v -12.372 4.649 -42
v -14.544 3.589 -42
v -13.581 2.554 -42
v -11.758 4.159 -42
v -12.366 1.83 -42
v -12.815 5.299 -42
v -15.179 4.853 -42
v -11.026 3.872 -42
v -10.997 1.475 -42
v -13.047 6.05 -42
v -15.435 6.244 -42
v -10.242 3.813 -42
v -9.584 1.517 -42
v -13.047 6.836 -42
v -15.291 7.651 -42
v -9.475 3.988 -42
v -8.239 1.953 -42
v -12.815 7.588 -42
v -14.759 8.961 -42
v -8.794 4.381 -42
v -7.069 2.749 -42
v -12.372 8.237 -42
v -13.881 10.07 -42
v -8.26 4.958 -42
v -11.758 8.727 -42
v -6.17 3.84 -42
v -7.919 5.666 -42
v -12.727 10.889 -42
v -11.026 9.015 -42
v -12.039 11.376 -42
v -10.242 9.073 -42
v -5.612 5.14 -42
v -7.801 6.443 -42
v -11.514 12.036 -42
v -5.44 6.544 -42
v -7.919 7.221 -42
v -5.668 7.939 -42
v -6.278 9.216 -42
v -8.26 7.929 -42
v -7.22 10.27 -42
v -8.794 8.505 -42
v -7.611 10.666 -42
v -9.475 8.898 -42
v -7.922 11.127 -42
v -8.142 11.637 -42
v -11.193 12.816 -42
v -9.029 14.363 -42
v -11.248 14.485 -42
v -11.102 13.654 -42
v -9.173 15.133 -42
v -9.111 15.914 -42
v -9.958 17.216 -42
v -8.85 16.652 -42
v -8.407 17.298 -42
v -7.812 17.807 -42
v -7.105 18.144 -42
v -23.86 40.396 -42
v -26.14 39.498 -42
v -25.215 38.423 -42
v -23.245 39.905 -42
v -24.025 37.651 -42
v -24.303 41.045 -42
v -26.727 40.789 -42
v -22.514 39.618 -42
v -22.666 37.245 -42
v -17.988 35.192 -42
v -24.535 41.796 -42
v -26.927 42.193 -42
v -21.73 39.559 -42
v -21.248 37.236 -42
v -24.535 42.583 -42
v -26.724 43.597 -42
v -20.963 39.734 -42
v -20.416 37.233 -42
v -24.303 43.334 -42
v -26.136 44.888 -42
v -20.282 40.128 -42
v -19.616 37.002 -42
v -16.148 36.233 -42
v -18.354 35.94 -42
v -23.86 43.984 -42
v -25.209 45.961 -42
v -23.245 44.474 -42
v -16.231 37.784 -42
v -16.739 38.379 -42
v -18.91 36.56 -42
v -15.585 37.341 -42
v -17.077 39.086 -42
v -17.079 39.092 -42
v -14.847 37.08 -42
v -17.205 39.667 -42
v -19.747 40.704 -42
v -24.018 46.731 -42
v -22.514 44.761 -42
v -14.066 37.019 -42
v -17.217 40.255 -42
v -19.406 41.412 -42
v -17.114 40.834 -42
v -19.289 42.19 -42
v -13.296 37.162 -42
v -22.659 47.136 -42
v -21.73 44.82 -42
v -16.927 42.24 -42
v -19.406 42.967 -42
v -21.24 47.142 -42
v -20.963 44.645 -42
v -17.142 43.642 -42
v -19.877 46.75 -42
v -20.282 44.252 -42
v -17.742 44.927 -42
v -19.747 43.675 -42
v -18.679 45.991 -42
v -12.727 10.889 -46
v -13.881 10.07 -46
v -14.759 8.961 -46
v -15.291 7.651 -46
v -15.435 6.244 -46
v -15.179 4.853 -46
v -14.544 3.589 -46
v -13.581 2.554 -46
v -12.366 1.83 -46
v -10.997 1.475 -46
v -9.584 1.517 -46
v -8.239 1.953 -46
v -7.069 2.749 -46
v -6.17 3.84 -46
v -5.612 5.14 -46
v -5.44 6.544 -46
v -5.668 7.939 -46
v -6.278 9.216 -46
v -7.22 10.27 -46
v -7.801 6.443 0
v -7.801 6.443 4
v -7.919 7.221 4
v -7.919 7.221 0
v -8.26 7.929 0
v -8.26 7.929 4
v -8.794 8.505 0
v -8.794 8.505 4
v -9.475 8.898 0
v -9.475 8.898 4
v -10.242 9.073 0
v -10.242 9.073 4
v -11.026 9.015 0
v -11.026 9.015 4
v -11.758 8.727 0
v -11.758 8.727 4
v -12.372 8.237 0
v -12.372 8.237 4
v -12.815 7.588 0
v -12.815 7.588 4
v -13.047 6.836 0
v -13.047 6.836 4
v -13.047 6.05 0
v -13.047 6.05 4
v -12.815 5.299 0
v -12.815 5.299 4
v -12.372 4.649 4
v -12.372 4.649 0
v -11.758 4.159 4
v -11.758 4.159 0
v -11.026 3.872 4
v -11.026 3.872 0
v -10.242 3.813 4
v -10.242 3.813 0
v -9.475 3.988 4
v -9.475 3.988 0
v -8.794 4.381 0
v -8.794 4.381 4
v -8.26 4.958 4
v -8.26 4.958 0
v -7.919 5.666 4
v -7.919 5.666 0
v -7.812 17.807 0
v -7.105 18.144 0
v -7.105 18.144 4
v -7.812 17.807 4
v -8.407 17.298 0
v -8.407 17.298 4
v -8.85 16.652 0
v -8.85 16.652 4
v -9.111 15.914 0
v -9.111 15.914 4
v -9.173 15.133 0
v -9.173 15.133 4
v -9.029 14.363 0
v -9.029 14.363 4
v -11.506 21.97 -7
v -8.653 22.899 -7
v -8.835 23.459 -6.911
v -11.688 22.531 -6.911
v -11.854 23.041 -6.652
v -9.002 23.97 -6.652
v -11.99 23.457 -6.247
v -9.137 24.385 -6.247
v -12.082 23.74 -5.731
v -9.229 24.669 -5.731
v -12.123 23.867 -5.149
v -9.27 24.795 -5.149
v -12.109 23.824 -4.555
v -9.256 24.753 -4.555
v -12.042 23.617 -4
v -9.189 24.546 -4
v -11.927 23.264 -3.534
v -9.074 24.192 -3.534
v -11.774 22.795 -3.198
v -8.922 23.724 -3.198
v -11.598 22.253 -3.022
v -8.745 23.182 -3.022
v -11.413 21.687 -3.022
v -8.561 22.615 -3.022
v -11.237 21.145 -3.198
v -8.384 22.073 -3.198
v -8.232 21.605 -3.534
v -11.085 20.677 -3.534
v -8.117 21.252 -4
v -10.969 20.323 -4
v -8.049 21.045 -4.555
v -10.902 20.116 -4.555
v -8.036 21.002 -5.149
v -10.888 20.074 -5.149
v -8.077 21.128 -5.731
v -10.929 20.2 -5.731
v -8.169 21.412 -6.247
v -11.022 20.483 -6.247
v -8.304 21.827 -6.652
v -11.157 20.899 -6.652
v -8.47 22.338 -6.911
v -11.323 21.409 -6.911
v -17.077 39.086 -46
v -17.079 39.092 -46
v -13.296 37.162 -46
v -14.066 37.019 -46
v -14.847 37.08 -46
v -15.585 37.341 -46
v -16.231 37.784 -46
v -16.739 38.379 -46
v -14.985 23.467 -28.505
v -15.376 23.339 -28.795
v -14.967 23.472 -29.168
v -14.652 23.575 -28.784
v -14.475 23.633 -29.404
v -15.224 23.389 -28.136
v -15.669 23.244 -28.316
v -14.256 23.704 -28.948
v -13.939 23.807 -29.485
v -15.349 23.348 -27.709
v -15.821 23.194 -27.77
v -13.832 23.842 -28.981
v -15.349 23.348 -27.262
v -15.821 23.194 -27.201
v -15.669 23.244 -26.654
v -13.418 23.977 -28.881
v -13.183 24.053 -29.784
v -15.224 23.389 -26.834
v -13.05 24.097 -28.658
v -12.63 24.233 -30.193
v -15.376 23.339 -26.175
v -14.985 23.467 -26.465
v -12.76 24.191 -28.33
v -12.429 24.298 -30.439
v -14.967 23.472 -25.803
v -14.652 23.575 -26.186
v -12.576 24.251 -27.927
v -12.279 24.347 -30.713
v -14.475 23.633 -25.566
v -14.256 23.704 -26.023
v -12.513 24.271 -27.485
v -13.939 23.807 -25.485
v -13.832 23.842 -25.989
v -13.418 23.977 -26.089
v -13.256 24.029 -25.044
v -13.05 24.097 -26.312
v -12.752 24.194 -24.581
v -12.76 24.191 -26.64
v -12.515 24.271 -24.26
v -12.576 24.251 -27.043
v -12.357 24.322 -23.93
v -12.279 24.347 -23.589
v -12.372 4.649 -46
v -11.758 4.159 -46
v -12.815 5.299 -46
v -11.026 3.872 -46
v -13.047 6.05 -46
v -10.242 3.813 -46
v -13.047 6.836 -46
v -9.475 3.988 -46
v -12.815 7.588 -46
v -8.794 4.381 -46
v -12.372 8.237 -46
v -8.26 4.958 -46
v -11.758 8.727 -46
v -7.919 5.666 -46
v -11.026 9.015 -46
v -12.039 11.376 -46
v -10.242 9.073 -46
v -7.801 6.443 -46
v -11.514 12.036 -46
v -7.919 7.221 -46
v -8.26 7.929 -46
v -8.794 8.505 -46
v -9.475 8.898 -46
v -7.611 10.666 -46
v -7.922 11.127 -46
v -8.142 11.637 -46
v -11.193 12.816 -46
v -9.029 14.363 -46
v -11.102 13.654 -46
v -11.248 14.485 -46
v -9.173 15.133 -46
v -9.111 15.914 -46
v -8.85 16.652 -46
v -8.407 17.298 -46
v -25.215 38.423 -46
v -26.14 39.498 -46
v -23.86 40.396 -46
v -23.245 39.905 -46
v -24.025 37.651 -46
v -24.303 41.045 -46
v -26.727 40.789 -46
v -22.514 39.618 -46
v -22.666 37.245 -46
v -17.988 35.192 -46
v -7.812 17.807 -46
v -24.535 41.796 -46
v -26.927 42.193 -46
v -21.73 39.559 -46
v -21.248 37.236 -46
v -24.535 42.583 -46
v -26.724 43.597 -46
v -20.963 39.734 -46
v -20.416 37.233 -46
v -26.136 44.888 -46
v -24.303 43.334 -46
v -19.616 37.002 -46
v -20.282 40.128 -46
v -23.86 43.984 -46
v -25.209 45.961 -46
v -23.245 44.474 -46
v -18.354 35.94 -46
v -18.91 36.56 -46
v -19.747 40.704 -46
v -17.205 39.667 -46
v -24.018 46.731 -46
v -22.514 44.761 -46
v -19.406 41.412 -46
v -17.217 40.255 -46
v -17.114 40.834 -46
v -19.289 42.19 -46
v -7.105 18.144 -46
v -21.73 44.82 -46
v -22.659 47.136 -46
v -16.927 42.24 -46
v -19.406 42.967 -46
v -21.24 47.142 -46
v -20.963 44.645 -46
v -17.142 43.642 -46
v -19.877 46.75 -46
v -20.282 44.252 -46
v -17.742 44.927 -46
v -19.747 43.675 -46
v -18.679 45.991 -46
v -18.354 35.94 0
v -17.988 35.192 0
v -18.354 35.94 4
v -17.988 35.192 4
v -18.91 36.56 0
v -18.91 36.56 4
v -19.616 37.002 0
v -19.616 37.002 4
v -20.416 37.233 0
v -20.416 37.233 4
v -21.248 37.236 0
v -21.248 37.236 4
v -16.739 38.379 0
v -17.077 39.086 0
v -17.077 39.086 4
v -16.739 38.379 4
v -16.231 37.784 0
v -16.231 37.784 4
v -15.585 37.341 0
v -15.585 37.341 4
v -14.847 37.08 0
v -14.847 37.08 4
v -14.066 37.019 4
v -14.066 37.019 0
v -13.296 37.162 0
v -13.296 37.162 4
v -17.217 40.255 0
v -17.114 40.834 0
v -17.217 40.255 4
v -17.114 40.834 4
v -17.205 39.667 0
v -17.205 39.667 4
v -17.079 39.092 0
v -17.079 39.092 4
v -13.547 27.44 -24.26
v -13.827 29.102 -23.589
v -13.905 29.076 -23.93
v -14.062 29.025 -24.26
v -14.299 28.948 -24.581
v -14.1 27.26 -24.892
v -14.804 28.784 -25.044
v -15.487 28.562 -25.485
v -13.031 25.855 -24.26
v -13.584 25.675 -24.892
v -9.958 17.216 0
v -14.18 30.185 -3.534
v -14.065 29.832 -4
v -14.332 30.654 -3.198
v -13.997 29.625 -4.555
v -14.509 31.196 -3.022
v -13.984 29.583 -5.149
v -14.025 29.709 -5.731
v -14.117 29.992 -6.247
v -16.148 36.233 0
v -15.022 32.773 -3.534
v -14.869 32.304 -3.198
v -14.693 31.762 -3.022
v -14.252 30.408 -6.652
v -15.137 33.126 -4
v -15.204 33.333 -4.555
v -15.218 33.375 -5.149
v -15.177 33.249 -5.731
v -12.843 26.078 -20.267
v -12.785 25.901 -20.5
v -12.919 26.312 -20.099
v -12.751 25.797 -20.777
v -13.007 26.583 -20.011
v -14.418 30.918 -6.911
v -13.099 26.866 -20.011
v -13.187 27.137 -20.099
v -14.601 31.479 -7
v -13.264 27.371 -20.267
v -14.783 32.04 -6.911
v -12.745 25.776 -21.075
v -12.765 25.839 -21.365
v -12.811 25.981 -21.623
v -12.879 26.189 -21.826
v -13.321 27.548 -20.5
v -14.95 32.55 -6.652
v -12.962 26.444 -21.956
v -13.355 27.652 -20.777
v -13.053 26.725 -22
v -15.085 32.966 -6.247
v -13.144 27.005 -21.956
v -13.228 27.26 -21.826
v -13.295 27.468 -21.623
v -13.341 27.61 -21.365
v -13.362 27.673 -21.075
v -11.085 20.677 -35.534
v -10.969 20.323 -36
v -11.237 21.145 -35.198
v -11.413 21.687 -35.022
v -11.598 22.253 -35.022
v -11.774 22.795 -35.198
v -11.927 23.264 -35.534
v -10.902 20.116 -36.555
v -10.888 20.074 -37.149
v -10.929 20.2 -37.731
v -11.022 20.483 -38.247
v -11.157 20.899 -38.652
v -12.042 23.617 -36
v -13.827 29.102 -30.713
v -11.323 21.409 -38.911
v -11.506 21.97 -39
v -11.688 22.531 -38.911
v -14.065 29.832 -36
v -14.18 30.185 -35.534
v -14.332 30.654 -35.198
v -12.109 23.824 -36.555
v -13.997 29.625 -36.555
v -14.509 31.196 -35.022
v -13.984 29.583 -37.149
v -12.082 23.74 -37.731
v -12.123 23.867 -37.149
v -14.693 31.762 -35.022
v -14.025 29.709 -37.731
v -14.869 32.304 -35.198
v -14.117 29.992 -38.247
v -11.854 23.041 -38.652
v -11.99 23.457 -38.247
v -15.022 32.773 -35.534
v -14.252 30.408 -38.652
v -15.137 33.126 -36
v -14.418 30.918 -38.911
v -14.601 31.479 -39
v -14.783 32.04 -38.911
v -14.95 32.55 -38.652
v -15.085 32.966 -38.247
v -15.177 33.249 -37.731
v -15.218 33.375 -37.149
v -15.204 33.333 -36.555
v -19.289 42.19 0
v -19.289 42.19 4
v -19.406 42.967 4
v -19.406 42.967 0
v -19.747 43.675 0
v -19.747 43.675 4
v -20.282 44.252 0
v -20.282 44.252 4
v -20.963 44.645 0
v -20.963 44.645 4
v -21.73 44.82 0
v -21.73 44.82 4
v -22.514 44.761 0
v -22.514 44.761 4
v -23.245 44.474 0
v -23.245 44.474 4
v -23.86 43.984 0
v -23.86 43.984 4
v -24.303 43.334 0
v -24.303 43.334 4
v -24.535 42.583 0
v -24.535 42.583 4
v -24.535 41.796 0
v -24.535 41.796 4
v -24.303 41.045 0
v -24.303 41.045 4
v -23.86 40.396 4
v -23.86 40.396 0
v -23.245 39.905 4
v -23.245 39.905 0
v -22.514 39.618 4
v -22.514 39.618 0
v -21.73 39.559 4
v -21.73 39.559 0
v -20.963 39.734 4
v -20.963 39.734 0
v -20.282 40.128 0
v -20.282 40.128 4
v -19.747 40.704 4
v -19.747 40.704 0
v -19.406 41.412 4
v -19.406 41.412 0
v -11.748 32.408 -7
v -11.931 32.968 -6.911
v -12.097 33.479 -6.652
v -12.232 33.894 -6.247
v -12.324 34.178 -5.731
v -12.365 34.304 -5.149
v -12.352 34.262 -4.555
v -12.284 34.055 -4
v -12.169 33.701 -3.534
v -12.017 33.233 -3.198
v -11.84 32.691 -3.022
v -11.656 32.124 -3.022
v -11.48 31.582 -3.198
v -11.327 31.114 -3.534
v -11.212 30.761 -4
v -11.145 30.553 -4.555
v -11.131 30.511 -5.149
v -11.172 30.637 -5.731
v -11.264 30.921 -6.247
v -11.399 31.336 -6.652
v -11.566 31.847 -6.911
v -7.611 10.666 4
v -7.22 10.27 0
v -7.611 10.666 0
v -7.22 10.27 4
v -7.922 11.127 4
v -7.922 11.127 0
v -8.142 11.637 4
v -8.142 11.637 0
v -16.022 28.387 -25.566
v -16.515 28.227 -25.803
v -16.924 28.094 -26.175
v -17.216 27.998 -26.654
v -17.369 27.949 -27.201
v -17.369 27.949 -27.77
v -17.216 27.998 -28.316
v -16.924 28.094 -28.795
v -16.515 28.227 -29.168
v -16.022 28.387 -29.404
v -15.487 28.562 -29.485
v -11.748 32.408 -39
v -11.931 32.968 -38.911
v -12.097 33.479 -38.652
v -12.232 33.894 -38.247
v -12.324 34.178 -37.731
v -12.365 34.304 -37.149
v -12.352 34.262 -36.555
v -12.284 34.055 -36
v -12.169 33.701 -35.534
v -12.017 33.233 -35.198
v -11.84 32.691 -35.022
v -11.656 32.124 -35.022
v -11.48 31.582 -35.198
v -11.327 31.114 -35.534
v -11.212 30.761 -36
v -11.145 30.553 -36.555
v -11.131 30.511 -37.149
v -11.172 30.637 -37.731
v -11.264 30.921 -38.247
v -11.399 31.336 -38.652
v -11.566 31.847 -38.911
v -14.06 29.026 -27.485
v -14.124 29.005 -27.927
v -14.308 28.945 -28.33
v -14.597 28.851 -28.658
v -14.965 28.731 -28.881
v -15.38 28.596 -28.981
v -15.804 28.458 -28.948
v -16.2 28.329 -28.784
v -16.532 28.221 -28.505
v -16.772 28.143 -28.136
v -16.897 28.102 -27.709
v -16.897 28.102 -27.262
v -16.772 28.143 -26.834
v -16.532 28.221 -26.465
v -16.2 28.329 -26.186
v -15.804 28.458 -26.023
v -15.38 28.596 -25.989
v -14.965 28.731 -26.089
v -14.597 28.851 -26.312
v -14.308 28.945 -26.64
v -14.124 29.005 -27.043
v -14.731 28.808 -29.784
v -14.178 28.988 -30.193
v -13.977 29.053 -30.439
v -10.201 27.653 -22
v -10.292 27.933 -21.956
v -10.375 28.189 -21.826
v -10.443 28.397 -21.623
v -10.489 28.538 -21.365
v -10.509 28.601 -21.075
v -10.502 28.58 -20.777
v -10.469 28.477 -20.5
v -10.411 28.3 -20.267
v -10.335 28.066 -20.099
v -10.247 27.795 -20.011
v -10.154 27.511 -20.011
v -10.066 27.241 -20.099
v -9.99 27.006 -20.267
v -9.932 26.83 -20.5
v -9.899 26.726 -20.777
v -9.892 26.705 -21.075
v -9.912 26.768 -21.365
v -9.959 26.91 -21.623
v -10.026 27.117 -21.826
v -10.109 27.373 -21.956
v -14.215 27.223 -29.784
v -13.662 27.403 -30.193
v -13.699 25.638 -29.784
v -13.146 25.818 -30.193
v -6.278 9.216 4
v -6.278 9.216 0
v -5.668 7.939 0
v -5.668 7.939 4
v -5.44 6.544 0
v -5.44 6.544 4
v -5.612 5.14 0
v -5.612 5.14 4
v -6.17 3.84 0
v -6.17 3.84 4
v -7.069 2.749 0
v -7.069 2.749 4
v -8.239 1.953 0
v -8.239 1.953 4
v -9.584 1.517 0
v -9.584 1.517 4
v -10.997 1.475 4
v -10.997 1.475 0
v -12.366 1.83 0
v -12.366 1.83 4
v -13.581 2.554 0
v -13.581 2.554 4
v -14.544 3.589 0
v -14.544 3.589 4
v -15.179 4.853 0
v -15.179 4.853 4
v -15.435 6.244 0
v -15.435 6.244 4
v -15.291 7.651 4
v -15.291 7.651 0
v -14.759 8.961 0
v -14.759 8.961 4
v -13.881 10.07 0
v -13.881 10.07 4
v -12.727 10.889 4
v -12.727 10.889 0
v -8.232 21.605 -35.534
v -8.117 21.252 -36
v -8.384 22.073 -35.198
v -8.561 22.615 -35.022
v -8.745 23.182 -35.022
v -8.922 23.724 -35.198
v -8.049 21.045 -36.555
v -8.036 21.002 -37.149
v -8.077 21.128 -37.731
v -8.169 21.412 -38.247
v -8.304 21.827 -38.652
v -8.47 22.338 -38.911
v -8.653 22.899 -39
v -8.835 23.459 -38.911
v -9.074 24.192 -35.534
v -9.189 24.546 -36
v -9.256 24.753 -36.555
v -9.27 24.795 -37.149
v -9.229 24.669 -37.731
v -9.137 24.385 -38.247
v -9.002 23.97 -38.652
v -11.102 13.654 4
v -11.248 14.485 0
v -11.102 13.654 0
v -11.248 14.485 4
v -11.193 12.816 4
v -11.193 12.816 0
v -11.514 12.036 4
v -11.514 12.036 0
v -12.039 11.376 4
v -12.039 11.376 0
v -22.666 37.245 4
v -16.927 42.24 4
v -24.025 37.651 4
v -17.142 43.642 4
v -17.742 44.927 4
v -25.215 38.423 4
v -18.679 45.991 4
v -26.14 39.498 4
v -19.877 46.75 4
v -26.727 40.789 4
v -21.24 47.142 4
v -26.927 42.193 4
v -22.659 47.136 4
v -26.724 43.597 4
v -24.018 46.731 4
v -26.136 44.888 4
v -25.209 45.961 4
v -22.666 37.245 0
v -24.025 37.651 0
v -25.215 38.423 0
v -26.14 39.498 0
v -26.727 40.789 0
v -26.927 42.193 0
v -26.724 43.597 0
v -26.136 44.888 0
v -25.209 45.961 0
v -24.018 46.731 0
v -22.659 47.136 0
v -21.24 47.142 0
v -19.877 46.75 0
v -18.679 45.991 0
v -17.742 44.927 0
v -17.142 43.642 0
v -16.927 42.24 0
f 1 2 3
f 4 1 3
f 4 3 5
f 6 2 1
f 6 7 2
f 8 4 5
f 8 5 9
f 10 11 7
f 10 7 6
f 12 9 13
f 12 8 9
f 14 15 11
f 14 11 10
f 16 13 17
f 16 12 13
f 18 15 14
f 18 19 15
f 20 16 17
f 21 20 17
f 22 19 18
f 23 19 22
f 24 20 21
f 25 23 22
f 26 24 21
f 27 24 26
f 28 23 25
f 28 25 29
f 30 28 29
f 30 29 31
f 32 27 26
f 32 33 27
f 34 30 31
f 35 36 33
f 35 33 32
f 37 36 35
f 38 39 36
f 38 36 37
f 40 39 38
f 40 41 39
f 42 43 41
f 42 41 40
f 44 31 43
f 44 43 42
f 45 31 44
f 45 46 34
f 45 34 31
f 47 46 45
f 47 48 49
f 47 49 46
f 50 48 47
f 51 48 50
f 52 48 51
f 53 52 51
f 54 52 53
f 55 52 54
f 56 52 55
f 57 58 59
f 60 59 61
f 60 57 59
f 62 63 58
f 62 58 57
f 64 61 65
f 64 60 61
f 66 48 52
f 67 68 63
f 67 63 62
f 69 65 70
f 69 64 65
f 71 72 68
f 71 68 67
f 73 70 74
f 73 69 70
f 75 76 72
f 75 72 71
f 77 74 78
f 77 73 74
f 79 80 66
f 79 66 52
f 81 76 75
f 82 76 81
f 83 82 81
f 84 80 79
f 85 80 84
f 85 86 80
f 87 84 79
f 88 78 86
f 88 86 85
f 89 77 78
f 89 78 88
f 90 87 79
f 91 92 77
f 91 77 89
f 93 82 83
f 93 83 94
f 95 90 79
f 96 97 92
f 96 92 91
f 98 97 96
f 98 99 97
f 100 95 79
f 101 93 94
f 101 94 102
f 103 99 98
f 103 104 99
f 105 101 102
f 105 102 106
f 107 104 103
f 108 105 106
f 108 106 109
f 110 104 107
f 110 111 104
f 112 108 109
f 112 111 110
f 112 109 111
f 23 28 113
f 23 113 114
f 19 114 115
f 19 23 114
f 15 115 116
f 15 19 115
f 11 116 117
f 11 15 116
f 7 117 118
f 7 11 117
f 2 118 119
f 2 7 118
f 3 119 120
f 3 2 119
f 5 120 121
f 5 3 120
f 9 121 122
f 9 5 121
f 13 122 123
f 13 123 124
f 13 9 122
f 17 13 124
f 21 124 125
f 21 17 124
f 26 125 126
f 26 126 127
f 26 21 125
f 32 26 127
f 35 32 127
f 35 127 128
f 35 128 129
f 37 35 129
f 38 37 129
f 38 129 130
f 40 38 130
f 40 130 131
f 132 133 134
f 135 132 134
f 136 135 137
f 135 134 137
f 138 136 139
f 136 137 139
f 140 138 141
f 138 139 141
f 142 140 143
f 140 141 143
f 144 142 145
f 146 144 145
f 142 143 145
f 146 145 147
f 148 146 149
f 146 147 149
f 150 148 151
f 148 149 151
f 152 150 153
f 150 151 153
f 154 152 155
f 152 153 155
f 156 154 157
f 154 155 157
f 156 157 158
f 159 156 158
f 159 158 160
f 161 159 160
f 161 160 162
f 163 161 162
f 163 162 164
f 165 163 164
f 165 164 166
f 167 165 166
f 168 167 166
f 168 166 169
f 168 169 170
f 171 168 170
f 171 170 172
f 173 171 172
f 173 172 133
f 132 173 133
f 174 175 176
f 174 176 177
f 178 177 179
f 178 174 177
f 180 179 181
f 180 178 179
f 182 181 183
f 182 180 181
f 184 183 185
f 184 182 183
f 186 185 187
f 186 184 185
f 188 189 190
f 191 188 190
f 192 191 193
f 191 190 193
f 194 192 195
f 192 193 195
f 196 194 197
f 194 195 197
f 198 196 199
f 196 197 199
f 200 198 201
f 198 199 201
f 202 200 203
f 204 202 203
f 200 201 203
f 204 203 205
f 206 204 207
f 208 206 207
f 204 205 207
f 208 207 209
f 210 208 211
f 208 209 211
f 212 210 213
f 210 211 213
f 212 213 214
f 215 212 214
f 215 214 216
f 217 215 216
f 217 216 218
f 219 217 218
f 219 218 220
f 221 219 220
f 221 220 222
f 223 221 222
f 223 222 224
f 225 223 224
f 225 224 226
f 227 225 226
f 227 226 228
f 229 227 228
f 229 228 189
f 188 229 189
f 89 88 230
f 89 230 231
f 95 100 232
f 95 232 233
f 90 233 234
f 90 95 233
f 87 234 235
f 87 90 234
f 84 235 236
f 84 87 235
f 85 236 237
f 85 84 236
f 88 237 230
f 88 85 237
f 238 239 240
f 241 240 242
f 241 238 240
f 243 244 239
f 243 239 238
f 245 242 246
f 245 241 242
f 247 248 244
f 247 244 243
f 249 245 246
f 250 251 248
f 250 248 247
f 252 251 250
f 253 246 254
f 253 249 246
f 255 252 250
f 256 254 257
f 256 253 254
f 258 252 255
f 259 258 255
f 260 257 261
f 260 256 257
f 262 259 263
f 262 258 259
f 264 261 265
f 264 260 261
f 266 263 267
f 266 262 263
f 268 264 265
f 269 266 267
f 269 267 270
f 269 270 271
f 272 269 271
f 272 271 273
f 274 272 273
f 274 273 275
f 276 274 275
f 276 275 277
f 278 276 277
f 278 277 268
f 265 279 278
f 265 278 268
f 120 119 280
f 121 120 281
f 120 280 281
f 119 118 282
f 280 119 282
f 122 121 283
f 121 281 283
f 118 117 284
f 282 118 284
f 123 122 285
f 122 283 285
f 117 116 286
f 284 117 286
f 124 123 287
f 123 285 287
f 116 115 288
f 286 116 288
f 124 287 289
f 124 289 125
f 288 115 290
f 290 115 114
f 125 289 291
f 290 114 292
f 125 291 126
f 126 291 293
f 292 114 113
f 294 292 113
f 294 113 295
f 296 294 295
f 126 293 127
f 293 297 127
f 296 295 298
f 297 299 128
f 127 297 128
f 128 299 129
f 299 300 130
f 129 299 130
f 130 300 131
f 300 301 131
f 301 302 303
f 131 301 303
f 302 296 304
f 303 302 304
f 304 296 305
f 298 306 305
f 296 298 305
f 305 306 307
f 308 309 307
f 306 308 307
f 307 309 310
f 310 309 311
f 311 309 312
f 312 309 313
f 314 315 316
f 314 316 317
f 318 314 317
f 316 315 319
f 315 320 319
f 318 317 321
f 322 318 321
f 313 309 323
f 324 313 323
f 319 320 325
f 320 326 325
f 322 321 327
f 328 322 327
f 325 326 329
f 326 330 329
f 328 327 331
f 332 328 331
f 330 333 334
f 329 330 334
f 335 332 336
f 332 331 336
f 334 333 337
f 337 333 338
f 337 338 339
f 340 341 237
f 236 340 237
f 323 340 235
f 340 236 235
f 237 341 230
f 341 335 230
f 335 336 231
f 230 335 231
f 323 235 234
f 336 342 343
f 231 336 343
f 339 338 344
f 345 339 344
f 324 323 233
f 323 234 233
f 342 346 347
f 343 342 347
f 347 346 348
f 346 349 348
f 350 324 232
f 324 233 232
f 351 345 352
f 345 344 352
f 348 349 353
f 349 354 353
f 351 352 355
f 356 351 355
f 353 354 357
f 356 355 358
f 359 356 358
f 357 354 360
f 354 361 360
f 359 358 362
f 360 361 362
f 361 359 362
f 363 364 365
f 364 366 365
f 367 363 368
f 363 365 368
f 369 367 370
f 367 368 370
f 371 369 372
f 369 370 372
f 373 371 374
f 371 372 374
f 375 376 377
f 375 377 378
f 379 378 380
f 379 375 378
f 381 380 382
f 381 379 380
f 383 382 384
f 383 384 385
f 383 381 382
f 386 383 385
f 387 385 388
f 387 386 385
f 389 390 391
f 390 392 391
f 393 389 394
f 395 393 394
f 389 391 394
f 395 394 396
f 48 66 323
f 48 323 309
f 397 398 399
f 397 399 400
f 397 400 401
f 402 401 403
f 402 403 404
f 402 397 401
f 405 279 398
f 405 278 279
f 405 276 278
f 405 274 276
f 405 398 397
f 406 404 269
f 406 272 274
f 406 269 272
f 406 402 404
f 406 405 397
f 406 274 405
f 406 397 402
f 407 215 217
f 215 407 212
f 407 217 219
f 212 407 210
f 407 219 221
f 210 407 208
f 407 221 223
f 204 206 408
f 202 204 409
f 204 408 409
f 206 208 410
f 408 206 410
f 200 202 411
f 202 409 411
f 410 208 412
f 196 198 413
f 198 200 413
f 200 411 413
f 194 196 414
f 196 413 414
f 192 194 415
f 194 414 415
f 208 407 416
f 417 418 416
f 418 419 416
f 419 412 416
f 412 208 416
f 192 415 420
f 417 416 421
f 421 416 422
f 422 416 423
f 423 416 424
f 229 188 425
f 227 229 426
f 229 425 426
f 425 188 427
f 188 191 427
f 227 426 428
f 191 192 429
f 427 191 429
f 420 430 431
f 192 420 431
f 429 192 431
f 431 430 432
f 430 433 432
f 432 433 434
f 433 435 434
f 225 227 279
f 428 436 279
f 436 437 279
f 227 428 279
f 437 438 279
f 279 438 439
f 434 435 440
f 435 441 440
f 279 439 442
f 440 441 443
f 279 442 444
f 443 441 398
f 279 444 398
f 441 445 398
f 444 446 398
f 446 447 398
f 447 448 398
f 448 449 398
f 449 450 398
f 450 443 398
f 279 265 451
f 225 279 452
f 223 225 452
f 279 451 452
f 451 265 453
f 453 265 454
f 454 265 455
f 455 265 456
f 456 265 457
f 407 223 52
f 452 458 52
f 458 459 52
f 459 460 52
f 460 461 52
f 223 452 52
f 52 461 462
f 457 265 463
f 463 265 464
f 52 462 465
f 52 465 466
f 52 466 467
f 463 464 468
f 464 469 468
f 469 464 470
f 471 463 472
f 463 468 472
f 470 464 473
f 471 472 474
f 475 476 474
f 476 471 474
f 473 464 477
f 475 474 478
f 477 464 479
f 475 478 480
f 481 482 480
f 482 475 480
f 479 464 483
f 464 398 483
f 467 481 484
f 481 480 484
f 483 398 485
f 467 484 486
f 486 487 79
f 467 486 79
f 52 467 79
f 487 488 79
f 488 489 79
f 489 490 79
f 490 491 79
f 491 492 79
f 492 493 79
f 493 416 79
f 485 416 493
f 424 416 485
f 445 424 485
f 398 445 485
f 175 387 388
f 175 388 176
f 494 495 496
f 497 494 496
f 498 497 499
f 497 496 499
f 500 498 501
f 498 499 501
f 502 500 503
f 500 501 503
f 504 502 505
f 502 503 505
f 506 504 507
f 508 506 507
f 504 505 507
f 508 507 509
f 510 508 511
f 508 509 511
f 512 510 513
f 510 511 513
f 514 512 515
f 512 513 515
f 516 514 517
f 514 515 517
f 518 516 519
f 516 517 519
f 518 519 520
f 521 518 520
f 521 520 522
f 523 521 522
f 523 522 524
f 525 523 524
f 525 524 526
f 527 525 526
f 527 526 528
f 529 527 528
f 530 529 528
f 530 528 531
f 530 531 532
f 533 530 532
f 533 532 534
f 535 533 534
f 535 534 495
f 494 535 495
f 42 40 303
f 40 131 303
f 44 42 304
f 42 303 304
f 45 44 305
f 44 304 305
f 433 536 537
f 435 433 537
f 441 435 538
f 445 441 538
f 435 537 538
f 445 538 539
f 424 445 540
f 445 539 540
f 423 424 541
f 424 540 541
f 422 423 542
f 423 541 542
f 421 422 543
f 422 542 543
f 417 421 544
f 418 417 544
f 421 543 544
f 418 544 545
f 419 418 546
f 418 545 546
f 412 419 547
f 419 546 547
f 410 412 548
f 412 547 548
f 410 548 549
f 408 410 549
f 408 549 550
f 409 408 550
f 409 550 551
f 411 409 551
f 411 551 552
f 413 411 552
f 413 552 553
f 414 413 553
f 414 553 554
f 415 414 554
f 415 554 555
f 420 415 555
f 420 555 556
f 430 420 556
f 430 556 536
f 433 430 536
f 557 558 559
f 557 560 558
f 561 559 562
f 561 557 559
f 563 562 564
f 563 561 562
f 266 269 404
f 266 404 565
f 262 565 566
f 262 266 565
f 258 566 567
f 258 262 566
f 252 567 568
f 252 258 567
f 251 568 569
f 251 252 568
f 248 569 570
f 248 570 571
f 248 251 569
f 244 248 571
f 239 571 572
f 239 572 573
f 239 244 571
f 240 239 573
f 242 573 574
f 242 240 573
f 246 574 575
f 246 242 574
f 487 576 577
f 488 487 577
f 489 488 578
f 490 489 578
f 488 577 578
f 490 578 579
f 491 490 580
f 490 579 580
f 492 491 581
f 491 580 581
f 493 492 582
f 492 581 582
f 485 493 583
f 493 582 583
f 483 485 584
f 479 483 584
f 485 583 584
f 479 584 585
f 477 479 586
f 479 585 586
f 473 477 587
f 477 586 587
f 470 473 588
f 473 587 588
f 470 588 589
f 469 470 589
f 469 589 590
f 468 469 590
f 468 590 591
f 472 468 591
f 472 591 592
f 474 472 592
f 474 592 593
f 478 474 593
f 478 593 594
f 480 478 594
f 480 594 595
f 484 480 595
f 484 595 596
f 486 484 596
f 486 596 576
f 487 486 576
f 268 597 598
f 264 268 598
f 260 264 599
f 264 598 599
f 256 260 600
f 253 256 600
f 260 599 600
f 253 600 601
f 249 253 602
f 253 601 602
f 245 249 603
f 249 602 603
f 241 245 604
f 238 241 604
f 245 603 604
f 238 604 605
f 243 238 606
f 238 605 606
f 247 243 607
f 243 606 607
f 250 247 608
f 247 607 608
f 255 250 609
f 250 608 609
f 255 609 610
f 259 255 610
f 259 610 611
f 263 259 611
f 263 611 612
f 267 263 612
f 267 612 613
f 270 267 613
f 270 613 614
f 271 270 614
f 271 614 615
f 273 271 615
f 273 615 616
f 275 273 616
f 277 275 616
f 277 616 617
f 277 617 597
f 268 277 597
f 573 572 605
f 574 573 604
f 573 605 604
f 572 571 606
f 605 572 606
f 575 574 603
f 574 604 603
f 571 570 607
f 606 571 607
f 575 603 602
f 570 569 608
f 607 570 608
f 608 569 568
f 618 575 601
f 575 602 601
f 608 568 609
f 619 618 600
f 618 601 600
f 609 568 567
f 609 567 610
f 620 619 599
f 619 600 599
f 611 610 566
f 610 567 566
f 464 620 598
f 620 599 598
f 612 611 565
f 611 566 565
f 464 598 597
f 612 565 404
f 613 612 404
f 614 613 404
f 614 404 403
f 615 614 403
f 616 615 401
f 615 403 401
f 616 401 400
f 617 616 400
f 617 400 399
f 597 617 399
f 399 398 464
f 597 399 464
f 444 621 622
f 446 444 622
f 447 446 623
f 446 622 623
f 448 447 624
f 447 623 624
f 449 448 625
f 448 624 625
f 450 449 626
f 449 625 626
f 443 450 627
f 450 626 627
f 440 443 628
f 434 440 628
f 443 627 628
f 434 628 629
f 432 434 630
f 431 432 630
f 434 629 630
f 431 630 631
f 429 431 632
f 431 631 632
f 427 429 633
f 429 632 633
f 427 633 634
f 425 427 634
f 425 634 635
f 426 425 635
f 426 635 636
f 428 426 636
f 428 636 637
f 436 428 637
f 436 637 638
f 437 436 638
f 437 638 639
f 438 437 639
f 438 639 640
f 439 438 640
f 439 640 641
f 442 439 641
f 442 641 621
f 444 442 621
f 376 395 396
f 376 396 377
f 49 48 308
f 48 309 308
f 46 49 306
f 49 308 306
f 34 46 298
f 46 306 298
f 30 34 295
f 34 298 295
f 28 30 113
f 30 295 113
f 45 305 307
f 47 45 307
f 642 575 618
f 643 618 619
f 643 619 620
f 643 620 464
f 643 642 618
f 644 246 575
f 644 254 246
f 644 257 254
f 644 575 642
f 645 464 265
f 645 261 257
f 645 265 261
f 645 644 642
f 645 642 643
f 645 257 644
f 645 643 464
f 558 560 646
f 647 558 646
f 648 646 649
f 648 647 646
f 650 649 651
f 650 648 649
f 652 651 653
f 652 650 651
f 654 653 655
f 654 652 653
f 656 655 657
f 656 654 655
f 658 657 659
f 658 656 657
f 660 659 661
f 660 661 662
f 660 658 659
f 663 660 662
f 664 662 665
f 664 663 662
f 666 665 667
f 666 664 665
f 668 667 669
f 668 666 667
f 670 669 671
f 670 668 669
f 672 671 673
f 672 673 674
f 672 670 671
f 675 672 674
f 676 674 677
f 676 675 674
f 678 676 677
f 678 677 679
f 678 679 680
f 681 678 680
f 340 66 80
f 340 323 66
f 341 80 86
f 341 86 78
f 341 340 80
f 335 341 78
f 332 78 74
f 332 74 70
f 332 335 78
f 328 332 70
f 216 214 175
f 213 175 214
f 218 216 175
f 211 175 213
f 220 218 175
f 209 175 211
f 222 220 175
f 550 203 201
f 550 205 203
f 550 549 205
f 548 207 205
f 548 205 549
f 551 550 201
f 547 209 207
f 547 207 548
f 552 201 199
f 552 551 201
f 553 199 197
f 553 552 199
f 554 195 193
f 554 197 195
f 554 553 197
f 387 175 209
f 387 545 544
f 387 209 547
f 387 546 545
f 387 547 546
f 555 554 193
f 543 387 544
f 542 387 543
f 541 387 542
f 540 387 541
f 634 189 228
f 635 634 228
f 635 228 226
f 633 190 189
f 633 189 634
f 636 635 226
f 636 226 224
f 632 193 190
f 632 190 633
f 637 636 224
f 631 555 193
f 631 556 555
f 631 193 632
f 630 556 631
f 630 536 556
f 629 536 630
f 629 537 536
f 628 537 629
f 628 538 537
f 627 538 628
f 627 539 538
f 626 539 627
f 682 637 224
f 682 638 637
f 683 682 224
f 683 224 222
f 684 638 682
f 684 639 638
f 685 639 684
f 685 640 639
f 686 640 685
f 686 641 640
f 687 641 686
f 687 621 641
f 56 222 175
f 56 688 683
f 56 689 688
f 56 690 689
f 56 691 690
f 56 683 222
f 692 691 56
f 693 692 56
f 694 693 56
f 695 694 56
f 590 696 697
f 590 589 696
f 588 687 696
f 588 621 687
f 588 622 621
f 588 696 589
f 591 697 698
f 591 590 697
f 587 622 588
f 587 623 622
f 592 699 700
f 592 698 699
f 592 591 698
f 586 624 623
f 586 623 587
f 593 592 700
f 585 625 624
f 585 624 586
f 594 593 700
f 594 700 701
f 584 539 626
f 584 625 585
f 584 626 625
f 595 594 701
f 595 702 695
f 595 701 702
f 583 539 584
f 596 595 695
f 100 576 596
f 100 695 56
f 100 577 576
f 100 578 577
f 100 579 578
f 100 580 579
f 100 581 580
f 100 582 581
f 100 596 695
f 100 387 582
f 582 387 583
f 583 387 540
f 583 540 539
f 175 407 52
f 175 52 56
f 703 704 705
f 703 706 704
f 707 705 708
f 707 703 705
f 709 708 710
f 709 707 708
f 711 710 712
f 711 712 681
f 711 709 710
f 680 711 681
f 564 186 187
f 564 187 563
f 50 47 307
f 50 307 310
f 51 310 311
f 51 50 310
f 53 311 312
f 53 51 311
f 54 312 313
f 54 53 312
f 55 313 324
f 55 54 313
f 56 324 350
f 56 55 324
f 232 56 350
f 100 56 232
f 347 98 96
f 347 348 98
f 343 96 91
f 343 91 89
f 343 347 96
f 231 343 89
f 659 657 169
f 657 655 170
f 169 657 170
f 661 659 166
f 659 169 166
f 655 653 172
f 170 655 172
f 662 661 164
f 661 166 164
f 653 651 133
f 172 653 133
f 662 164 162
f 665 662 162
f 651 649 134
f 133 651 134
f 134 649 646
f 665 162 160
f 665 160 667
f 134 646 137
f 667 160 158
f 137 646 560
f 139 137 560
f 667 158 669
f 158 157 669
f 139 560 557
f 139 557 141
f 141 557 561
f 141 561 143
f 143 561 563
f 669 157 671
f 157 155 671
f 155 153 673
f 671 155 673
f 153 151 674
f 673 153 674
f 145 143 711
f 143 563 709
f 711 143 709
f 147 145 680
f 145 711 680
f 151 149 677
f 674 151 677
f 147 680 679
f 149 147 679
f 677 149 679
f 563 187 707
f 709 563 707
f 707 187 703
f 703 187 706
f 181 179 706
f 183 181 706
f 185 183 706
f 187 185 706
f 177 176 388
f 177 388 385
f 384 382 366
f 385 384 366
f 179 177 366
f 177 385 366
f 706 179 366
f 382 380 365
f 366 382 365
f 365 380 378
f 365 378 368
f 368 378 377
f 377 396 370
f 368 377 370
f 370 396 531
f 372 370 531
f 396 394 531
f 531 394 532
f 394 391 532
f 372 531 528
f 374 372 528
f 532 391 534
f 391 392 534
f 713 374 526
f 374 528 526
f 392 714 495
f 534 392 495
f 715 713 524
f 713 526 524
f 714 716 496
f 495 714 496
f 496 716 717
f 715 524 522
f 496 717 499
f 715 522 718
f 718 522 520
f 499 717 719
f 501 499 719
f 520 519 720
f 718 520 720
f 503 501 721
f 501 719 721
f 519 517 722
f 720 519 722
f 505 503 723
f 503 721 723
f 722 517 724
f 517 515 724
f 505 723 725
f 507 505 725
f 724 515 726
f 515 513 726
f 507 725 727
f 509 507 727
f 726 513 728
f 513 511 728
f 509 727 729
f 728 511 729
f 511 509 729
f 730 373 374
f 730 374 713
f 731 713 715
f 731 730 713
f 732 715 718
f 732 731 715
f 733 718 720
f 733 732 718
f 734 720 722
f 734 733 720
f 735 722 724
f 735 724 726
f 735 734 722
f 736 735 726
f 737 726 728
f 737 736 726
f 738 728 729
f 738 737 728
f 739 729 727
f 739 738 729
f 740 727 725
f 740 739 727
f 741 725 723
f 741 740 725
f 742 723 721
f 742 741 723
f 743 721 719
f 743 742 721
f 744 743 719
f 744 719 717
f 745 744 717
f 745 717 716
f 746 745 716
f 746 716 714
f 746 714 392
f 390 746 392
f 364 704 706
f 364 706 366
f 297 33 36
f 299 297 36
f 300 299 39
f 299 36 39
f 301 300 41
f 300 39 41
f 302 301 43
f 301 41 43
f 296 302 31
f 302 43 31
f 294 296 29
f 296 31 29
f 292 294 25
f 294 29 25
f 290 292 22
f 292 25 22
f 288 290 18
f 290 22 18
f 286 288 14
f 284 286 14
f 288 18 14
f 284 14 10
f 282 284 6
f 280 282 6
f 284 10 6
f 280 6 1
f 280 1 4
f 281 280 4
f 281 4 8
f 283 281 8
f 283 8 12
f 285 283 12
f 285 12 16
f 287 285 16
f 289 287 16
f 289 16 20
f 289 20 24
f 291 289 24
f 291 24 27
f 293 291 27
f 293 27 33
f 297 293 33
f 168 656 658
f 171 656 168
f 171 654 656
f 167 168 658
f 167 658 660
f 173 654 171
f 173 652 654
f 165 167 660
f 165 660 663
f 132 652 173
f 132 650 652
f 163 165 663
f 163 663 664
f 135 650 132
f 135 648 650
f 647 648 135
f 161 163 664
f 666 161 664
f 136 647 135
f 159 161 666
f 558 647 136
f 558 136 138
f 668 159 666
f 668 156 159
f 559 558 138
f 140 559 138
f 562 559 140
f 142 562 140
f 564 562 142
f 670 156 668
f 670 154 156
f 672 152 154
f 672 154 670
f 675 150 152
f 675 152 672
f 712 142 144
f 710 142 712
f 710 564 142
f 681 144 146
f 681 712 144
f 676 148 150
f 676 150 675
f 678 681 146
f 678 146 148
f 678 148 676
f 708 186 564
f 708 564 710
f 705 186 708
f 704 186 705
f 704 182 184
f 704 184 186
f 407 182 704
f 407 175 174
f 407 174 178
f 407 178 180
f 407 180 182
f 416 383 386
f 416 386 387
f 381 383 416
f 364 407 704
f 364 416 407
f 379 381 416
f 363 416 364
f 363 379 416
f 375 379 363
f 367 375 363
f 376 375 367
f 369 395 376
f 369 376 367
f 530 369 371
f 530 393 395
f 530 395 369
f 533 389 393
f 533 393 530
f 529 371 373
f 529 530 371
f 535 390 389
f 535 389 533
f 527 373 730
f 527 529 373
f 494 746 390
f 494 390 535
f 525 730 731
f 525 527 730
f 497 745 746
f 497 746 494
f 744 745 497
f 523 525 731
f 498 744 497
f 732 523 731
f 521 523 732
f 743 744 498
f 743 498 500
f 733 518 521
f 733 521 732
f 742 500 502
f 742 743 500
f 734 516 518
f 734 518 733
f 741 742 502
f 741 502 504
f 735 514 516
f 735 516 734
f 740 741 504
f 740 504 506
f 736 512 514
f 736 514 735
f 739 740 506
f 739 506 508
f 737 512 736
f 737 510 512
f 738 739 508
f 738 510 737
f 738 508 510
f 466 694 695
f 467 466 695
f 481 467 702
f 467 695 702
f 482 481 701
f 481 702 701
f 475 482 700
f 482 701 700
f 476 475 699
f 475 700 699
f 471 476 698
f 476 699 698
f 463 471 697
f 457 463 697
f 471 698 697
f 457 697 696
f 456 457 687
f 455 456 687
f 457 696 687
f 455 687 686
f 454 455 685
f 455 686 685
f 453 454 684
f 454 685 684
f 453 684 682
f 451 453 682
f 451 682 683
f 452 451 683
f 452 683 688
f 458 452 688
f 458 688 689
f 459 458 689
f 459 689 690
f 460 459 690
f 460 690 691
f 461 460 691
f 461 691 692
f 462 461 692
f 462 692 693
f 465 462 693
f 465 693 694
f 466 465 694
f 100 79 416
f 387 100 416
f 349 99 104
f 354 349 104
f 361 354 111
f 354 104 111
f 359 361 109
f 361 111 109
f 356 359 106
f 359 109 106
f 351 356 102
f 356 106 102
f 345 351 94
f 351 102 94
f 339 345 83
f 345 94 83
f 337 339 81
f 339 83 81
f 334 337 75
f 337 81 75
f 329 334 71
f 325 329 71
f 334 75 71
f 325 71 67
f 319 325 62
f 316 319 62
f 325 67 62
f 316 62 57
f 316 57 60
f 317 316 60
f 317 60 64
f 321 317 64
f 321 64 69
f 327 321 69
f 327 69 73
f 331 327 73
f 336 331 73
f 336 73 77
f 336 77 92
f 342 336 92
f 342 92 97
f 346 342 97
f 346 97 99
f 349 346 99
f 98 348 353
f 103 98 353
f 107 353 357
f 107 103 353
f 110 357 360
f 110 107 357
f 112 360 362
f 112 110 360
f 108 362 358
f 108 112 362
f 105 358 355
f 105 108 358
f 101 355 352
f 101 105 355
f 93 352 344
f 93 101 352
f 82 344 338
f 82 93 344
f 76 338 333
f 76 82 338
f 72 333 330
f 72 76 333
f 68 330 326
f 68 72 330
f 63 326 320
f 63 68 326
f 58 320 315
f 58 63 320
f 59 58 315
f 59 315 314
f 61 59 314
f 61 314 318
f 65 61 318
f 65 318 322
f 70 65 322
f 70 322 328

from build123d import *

# Parameters (mm, degrees)
BOSS_EXTRUDE1_DEPTH          = 5
SKETCH6_W                    = 42
SKETCH6_H                    = 20
BOSS_EXTRUDE2_DEPTH          = 3
BOSS_EXTRUDE3_DEPTH          = 4
SKETCH14_W                   = 3
SKETCH14_H                   = 42
BOSS_EXTRUDE4_DEPTH          = 3
SKETCH15_W                   = 3
SKETCH15_H                   = 42
CUT_EXTRUDE1_DEPTH           = 3
BOSS_EXTRUDE5_DEPTH          = 4
F_2_0_2_DIAMETER_HOLE1_D     = 2
F_2_0_2_DIAMETER_HOLE1_DEPTH = 13.574856707
F_4_0_4_DIAMETER_HOLE1_D     = 4
F_4_0_4_DIAMETER_HOLE1_DEPTH = 13.574856707
HOLE1_D                      = 5.275
HOLE1_DEPTH                  = 4
HOLE2_D                      = 5.275
HOLE2_DEPTH                  = 4
F_3_0_3_DIAMETER_HOLE1_D     = 3
F_3_0_3_DIAMETER_HOLE1_DEPTH = 26.254229339
FILLET1_R                    = 3


with BuildPart() as part:
    # Sketch1 → Boss-Extrude1 (new body)
    with BuildSketch(Plane(origin=(-8.342407099, 25.628804584, 0), x_dir=(0.950891688, 0.309523823, 0), z_dir=(0.309523823, -0.950891688, 0))):
        with BuildLine():
            Line((-4.14030738, -30.713017444), (-4.14030738, -23.589232886))
            add(Edge.make_bspline(
                [(-4.14030738, -23.589232886), (-4.220798256, -24.279493403), (-4.802543831, -24.911473889), (-5.885544107, -25.485174345)],
                knots=[0, 0, 0, 0, 1, 1, 1, 1], degree=3))
            ThreePointArc((-5.885544107, -25.485174345), (-7.885544107, -27.485174345), (-5.885544107, -29.485174345))
            add(Edge.make_bspline(
                [(-5.885544107, -29.485174345), (-4.984417634, -29.728649028), (-4.402672059, -30.137930061), (-4.14030738, -30.713017444)],
                knots=[0, 0, 0, 0, 1, 1, 1, 1], degree=3))
        make_face()
    extrude(amount=-BOSS_EXTRUDE1_DEPTH)

    # Sketch6 → Boss-Extrude2 (add)
    with BuildSketch(Plane(origin=(-3.936983875, -1.281523768, 0), x_dir=(0, 0, 1), z_dir=(-0.950891688, -0.309523823, 0))):
        with Locations((-21, 29.452391)):
            Rectangle(SKETCH6_W, SKETCH6_H)
    extrude(amount=-BOSS_EXTRUDE2_DEPTH)

    # Sketch8 → Boss-Extrude3 (add)
    with BuildSketch(Plane.XY):
        with BuildLine():
            Line((-17.397624454, 40.071064625), (-17.077010229, 39.086101986))
            ThreePointArc((-17.077010229, 39.086101986), (-15.584881864, 37.340928389), (-13.295763695, 37.161998389))
            Line((-13.295763695, 37.161998389), (-7.105287237, 18.144164622))
            ThreePointArc((-7.105287237, 18.144164622), (-8.850460834, 16.652036257), (-9.029390833, 14.362918088))
            Line((-9.029390833, 14.362918088), (-7.842362425, 10.716234493))
            ThreePointArc((-7.842362425, 10.716234493), (-11.874437039, 1.653788416), (-10.256851829, 11.439950722))
            Line((-10.256851829, 11.439950722), (-18.956793202, 38.167140452))
            ThreePointArc((-18.956793202, 38.167140452), (-25.795005306, 45.357497095), (-17.397624454, 40.071064625))
        make_face()
    extrude(amount=BOSS_EXTRUDE3_DEPTH)

    # Sketch14 → Boss-Extrude4 (add)
    with BuildSketch(Plane(origin=(-6.020978427, 18.497116921, 0), x_dir=(-0.950891688, -0.309523823, 0), z_dir=(0.309523823, -0.950891688, 0))):
        with Locations((2.64030738, 21)):
            Rectangle(SKETCH14_W, SKETCH14_H)
    extrude(amount=BOSS_EXTRUDE4_DEPTH)

    # Sketch15 → Cut-Extrude1 (cut)
    with BuildSketch(Plane(origin=(-5.092406958, 15.644441856, 0), x_dir=(0.950891688, 0.309523823, 0), z_dir=(0.309523823, -0.950891688, 0))):
        with Locations((-2.64030738, -21)):
            Rectangle(SKETCH15_W, SKETCH15_H)
    extrude(amount=-CUT_EXTRUDE1_DEPTH, mode=Mode.SUBTRACT)

    # Sketch22 → Boss-Extrude5 (add)
    with BuildSketch(Plane(origin=(0, 0, -42), x_dir=(-1, 0, 0), z_dir=(0, 0, -1))):
        with BuildLine():
            Line((18.956793202, 38.167140452), (10.256851829, 11.439950722))
            ThreePointArc((10.256851829, 11.439950722), (11.874437039, 1.653788416), (7.842362425, 10.716234493))
            Line((7.842362425, 10.716234493), (9.029390833, 14.362918088))
            ThreePointArc((9.029390833, 14.362918088), (8.850460834, 16.652036257), (7.105287237, 18.144164622))
            Line((7.105287237, 18.144164622), (13.295763695, 37.161998389))
            ThreePointArc((13.295763695, 37.161998389), (15.584881864, 37.340928389), (17.077010229, 39.086101986))
            Line((17.077010229, 39.086101986), (17.397624454, 40.071064625))
            ThreePointArc((17.397624454, 40.071064625), (25.795005306, 45.357497095), (18.956793202, 38.167140452))
        make_face()
    extrude(amount=BOSS_EXTRUDE5_DEPTH)

    # Ø2.0 (2) Diameter Hole1
    with Locations(Plane(origin=(-3.936983875, -1.281523768, 0), x_dir=(0, 0, 1), z_dir=(-0.950891688, -0.309523823, 0))):
        with Locations((-21, 29.452391)):
            Hole(F_2_0_2_DIAMETER_HOLE1_D / 2, depth=F_2_0_2_DIAMETER_HOLE1_DEPTH)

    # Ø4.0 (4) Diameter Hole1
    with Locations(Plane(origin=(-3.936983875, -1.281523768, 0), x_dir=(0, 0, 1), z_dir=(-0.950891688, -0.309523823, 0))):
        with Locations((-5, 24.452391), (-37, 24.452391), (-37, 34.452391), (-5, 34.452391)):
            Hole(F_4_0_4_DIAMETER_HOLE1_D / 2, depth=F_4_0_4_DIAMETER_HOLE1_DEPTH)

    # Hole1
    with Locations(Plane(origin=(0, 0, -46), x_dir=(-1, 0, 0), z_dir=(0, 0, -1))):
        with Locations((10.438845238, 6.44326398), (21.926625837, 42.189589224)):
            Hole(HOLE1_D / 2, depth=HOLE1_DEPTH)

    # Hole2
    with Locations(Plane(origin=(0, 0, 0), x_dir=(-1, 0, 0), z_dir=(0, 0, -1))):
        with Locations((10.438845238, 6.44326398), (21.926625837, 42.189589224)):
            Hole(HOLE2_D / 2, depth=HOLE2_DEPTH)

    # Ø3.0 (3) Diameter Hole1
    with Locations(Plane(origin=(-8.342407099, 25.628804584, 0), x_dir=(-0.950891688, -0.309523823, 0), z_dir=(0.309523823, -0.950891688, 0))):
        with Locations((5.885544107, 27.485174345)):
            Hole(F_3_0_3_DIAMETER_HOLE1_D / 2, depth=F_3_0_3_DIAMETER_HOLE1_DEPTH)

    # Fillet1
    fillet1_edges = [part.edges().sort_by_distance(p)[0] for p in [
        (-17.397624454, 40.071064625, 2),
        (-18.956793202, 38.167140452, 2),
        (-10.256851829, 11.439950722, 2),
        (-7.842362425, 10.716234493, 2),
        (-18.956793202, 38.167140452, -44),
        (-17.397624454, 40.071064625, -44),
        (-7.842362425, 10.716234493, -44),
        (-10.256851829, 11.439950722, -44),
    ]]
    fillet(fillet1_edges, radius=FILLET1_R)


solid = part.part
